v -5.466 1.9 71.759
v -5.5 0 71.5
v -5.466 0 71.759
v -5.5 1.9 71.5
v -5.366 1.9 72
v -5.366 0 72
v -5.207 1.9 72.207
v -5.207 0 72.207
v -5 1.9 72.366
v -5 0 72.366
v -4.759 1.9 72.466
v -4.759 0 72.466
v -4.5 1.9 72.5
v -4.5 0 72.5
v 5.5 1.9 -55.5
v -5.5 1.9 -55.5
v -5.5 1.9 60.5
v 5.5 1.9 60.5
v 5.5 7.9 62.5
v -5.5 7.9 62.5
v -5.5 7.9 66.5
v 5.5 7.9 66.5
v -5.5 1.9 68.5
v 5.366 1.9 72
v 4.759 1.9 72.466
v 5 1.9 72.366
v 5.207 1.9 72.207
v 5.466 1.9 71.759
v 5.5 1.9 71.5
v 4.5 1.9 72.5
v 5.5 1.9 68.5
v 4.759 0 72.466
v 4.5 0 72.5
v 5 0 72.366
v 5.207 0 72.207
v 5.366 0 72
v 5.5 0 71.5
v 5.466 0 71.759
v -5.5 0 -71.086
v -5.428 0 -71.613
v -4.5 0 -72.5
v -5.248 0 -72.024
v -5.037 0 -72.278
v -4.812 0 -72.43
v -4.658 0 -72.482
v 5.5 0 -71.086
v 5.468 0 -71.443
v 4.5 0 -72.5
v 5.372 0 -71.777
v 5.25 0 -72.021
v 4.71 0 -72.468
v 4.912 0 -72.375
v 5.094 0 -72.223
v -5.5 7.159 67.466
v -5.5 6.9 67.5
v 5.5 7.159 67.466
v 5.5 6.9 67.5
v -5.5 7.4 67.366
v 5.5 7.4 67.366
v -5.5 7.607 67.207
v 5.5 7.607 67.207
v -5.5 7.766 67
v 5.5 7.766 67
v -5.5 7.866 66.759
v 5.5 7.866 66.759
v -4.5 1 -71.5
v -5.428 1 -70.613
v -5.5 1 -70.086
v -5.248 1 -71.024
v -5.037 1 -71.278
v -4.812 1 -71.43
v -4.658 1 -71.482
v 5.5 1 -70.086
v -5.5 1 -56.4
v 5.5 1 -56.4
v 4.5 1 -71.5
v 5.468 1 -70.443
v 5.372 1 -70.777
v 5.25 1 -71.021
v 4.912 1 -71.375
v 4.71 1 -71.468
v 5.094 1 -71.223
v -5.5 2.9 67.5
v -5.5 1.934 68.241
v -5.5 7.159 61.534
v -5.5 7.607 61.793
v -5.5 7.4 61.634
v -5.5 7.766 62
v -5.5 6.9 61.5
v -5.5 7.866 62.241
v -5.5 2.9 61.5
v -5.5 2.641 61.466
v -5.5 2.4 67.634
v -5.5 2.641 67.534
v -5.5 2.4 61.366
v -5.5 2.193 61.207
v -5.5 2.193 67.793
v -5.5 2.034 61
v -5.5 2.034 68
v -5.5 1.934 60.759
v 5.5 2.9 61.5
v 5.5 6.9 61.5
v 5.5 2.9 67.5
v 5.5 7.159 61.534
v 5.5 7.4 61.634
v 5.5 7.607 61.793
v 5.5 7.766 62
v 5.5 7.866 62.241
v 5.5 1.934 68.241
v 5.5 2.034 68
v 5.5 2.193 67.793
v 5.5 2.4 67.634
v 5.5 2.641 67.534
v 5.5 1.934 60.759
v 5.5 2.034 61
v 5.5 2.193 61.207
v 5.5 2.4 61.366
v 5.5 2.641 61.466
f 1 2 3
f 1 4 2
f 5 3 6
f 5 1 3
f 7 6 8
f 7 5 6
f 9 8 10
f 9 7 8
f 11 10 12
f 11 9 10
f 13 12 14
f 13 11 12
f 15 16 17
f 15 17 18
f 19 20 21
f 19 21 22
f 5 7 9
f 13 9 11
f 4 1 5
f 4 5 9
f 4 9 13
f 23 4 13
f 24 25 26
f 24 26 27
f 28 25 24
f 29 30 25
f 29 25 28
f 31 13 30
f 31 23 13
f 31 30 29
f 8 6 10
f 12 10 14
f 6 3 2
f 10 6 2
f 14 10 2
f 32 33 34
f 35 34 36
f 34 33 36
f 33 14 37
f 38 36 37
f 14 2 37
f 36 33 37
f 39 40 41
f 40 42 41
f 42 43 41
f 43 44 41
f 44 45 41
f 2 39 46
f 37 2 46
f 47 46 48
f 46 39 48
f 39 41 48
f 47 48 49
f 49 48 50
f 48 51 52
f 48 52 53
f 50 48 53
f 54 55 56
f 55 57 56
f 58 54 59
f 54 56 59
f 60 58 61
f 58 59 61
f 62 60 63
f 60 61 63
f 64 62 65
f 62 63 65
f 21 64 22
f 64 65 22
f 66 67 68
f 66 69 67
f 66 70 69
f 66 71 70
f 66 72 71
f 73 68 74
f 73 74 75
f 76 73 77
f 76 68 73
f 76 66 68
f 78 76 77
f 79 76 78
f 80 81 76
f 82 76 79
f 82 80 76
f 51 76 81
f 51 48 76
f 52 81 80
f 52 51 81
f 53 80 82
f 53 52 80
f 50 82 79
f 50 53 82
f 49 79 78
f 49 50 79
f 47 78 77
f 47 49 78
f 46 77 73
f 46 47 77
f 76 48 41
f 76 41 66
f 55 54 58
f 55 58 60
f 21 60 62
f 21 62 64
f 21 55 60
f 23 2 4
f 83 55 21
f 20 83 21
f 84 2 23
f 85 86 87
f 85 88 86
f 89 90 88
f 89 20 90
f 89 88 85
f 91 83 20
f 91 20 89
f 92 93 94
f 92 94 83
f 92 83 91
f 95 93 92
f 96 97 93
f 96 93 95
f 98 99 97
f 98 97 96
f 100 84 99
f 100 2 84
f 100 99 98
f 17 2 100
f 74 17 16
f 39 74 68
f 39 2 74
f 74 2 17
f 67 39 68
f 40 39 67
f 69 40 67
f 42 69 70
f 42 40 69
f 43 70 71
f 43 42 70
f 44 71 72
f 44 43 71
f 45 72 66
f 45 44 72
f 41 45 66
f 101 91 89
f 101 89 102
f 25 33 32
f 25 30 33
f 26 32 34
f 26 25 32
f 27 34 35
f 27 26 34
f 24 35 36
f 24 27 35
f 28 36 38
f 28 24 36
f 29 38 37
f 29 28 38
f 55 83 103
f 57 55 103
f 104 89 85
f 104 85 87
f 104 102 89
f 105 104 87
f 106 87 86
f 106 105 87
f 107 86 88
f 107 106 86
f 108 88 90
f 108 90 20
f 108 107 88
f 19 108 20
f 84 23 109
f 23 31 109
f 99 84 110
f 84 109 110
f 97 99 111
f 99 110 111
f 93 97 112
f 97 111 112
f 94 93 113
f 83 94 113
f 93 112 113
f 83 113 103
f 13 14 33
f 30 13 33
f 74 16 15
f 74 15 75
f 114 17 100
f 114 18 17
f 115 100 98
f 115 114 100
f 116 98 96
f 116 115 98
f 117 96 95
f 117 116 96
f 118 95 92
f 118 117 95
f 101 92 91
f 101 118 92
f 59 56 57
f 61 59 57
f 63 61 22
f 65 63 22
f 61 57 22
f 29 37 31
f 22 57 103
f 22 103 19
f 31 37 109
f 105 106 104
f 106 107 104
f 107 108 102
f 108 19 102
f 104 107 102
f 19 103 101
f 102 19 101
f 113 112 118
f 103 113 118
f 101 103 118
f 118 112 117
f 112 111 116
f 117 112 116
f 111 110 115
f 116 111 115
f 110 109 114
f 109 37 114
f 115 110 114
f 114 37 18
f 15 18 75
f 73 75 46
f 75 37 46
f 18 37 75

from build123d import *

# Parameters (mm, degrees)
SZKIC1_W                    = 11
SZKIC1_H                    = 145
DODANIE_WYCI_GNI_CIE1_DEPTH = 1.9
SZKIC3_W                    = 11
SZKIC3_H                    = 16
WYTNIJ_WYCI_GNI_CIE1_DEPTH  = 0.9
SFAZOWANIE1_SIZE            = 1
SZKIC2_W                    = 11
SZKIC2_H                    = 6
DODANIE_WYCI_GNI_CIE2_DEPTH = 6
ZAOKR_GLENIE1_R             = 1


with BuildPart() as part:
    # Szkic1 → Dodanie-wyciągnięcie1 (new body)
    with BuildSketch(Plane(origin=(0, 0, 0), x_dir=(1, 0, 0), z_dir=(0, 1, 0))):
        Rectangle(SZKIC1_W, SZKIC1_H)
    extrude(amount=DODANIE_WYCI_GNI_CIE1_DEPTH)

    # Szkic3 → Wytnij-wyciągnięcie1 (cut)
    with BuildSketch(Plane(origin=(0, 1.9, 0), x_dir=(1, 0, 0), z_dir=(0, 1, 0))):
        with Locations((0, 64.5)):
            Rectangle(SZKIC3_W, SZKIC3_H)
    extrude(amount=-WYTNIJ_WYCI_GNI_CIE1_DEPTH, mode=Mode.SUBTRACT)

    # Sfazowanie1
    # the kernel refuses this chamfer: 1 mm, written as the material it takes off along each edge
    with BuildSketch(Plane(origin=(-8.071682988, 1.9, -56.5), x_dir=(0, 0.0274958766105862, 0.9996219169112968), z_dir=(1, 0, 0))) as sfazowanie1_piece_1_section:
        Polygon((SFAZOWANIE1_SIZE * 0.999621916911, SFAZOWANIE1_SIZE * 0.0274958766106), (-SFAZOWANIE1_SIZE * 0.0274958766106, SFAZOWANIE1_SIZE * 0.999621916911), (0, 0), align=None)
    sfazowanie1_piece_1 = extrude(amount=16.143365976, mode=Mode.PRIVATE)
    sfazowanie1_piece_1 = split(sfazowanie1_piece_1, bisect_by=Plane(origin=(0, 1, -56.164099253), z_dir=(0, 1, 0)), keep=Keep.TOP, mode=Mode.PRIVATE)
    add(sfazowanie1_piece_1, mode=Mode.SUBTRACT)
    with BuildSketch(Plane(origin=(8.071682988, 1, -72.5), x_dir=(0, -0.999621916911297, -0.02749587661058218), z_dir=(-1, 0, 0))) as sfazowanie1_piece_2:
        Polygon((SFAZOWANIE1_SIZE * 0.999621916911, SFAZOWANIE1_SIZE * 0.0274958766106), (-SFAZOWANIE1_SIZE * 0.0274958766106, SFAZOWANIE1_SIZE * 0.999621916911), (0, 0), align=None)
    extrude(amount=16.143365976, mode=Mode.SUBTRACT)

    # Szkic2 → Dodanie-wyciągnięcie2 (add)
    with BuildSketch(Plane(origin=(0, 1.9, 0), x_dir=(1, 0, 0), z_dir=(0, 1, 0))):
        with Locations((0, -64.5)):
            Rectangle(SZKIC2_W, SZKIC2_H)
    extrude(amount=DODANIE_WYCI_GNI_CIE2_DEPTH)

    # Zaokrąglenie1
    zaokr_glenie1_edges = [part.edges().sort_by_distance(p)[0] for p in [
        (5.5, 0.5, -72),
        (-5.5, 0.5, -72),
        (0, 1.9, 67.5),
        (0, 1.9, 61.5),
        (0, 7.9, 67.5),
        (0, 7.9, 61.5),
        (5.5, 0.95, 72.5),
        (-5.5, 0.95, 72.5),
    ]]
    fillet(zaokr_glenie1_edges, radius=ZAOKR_GLENIE1_R)


solid = part.part
